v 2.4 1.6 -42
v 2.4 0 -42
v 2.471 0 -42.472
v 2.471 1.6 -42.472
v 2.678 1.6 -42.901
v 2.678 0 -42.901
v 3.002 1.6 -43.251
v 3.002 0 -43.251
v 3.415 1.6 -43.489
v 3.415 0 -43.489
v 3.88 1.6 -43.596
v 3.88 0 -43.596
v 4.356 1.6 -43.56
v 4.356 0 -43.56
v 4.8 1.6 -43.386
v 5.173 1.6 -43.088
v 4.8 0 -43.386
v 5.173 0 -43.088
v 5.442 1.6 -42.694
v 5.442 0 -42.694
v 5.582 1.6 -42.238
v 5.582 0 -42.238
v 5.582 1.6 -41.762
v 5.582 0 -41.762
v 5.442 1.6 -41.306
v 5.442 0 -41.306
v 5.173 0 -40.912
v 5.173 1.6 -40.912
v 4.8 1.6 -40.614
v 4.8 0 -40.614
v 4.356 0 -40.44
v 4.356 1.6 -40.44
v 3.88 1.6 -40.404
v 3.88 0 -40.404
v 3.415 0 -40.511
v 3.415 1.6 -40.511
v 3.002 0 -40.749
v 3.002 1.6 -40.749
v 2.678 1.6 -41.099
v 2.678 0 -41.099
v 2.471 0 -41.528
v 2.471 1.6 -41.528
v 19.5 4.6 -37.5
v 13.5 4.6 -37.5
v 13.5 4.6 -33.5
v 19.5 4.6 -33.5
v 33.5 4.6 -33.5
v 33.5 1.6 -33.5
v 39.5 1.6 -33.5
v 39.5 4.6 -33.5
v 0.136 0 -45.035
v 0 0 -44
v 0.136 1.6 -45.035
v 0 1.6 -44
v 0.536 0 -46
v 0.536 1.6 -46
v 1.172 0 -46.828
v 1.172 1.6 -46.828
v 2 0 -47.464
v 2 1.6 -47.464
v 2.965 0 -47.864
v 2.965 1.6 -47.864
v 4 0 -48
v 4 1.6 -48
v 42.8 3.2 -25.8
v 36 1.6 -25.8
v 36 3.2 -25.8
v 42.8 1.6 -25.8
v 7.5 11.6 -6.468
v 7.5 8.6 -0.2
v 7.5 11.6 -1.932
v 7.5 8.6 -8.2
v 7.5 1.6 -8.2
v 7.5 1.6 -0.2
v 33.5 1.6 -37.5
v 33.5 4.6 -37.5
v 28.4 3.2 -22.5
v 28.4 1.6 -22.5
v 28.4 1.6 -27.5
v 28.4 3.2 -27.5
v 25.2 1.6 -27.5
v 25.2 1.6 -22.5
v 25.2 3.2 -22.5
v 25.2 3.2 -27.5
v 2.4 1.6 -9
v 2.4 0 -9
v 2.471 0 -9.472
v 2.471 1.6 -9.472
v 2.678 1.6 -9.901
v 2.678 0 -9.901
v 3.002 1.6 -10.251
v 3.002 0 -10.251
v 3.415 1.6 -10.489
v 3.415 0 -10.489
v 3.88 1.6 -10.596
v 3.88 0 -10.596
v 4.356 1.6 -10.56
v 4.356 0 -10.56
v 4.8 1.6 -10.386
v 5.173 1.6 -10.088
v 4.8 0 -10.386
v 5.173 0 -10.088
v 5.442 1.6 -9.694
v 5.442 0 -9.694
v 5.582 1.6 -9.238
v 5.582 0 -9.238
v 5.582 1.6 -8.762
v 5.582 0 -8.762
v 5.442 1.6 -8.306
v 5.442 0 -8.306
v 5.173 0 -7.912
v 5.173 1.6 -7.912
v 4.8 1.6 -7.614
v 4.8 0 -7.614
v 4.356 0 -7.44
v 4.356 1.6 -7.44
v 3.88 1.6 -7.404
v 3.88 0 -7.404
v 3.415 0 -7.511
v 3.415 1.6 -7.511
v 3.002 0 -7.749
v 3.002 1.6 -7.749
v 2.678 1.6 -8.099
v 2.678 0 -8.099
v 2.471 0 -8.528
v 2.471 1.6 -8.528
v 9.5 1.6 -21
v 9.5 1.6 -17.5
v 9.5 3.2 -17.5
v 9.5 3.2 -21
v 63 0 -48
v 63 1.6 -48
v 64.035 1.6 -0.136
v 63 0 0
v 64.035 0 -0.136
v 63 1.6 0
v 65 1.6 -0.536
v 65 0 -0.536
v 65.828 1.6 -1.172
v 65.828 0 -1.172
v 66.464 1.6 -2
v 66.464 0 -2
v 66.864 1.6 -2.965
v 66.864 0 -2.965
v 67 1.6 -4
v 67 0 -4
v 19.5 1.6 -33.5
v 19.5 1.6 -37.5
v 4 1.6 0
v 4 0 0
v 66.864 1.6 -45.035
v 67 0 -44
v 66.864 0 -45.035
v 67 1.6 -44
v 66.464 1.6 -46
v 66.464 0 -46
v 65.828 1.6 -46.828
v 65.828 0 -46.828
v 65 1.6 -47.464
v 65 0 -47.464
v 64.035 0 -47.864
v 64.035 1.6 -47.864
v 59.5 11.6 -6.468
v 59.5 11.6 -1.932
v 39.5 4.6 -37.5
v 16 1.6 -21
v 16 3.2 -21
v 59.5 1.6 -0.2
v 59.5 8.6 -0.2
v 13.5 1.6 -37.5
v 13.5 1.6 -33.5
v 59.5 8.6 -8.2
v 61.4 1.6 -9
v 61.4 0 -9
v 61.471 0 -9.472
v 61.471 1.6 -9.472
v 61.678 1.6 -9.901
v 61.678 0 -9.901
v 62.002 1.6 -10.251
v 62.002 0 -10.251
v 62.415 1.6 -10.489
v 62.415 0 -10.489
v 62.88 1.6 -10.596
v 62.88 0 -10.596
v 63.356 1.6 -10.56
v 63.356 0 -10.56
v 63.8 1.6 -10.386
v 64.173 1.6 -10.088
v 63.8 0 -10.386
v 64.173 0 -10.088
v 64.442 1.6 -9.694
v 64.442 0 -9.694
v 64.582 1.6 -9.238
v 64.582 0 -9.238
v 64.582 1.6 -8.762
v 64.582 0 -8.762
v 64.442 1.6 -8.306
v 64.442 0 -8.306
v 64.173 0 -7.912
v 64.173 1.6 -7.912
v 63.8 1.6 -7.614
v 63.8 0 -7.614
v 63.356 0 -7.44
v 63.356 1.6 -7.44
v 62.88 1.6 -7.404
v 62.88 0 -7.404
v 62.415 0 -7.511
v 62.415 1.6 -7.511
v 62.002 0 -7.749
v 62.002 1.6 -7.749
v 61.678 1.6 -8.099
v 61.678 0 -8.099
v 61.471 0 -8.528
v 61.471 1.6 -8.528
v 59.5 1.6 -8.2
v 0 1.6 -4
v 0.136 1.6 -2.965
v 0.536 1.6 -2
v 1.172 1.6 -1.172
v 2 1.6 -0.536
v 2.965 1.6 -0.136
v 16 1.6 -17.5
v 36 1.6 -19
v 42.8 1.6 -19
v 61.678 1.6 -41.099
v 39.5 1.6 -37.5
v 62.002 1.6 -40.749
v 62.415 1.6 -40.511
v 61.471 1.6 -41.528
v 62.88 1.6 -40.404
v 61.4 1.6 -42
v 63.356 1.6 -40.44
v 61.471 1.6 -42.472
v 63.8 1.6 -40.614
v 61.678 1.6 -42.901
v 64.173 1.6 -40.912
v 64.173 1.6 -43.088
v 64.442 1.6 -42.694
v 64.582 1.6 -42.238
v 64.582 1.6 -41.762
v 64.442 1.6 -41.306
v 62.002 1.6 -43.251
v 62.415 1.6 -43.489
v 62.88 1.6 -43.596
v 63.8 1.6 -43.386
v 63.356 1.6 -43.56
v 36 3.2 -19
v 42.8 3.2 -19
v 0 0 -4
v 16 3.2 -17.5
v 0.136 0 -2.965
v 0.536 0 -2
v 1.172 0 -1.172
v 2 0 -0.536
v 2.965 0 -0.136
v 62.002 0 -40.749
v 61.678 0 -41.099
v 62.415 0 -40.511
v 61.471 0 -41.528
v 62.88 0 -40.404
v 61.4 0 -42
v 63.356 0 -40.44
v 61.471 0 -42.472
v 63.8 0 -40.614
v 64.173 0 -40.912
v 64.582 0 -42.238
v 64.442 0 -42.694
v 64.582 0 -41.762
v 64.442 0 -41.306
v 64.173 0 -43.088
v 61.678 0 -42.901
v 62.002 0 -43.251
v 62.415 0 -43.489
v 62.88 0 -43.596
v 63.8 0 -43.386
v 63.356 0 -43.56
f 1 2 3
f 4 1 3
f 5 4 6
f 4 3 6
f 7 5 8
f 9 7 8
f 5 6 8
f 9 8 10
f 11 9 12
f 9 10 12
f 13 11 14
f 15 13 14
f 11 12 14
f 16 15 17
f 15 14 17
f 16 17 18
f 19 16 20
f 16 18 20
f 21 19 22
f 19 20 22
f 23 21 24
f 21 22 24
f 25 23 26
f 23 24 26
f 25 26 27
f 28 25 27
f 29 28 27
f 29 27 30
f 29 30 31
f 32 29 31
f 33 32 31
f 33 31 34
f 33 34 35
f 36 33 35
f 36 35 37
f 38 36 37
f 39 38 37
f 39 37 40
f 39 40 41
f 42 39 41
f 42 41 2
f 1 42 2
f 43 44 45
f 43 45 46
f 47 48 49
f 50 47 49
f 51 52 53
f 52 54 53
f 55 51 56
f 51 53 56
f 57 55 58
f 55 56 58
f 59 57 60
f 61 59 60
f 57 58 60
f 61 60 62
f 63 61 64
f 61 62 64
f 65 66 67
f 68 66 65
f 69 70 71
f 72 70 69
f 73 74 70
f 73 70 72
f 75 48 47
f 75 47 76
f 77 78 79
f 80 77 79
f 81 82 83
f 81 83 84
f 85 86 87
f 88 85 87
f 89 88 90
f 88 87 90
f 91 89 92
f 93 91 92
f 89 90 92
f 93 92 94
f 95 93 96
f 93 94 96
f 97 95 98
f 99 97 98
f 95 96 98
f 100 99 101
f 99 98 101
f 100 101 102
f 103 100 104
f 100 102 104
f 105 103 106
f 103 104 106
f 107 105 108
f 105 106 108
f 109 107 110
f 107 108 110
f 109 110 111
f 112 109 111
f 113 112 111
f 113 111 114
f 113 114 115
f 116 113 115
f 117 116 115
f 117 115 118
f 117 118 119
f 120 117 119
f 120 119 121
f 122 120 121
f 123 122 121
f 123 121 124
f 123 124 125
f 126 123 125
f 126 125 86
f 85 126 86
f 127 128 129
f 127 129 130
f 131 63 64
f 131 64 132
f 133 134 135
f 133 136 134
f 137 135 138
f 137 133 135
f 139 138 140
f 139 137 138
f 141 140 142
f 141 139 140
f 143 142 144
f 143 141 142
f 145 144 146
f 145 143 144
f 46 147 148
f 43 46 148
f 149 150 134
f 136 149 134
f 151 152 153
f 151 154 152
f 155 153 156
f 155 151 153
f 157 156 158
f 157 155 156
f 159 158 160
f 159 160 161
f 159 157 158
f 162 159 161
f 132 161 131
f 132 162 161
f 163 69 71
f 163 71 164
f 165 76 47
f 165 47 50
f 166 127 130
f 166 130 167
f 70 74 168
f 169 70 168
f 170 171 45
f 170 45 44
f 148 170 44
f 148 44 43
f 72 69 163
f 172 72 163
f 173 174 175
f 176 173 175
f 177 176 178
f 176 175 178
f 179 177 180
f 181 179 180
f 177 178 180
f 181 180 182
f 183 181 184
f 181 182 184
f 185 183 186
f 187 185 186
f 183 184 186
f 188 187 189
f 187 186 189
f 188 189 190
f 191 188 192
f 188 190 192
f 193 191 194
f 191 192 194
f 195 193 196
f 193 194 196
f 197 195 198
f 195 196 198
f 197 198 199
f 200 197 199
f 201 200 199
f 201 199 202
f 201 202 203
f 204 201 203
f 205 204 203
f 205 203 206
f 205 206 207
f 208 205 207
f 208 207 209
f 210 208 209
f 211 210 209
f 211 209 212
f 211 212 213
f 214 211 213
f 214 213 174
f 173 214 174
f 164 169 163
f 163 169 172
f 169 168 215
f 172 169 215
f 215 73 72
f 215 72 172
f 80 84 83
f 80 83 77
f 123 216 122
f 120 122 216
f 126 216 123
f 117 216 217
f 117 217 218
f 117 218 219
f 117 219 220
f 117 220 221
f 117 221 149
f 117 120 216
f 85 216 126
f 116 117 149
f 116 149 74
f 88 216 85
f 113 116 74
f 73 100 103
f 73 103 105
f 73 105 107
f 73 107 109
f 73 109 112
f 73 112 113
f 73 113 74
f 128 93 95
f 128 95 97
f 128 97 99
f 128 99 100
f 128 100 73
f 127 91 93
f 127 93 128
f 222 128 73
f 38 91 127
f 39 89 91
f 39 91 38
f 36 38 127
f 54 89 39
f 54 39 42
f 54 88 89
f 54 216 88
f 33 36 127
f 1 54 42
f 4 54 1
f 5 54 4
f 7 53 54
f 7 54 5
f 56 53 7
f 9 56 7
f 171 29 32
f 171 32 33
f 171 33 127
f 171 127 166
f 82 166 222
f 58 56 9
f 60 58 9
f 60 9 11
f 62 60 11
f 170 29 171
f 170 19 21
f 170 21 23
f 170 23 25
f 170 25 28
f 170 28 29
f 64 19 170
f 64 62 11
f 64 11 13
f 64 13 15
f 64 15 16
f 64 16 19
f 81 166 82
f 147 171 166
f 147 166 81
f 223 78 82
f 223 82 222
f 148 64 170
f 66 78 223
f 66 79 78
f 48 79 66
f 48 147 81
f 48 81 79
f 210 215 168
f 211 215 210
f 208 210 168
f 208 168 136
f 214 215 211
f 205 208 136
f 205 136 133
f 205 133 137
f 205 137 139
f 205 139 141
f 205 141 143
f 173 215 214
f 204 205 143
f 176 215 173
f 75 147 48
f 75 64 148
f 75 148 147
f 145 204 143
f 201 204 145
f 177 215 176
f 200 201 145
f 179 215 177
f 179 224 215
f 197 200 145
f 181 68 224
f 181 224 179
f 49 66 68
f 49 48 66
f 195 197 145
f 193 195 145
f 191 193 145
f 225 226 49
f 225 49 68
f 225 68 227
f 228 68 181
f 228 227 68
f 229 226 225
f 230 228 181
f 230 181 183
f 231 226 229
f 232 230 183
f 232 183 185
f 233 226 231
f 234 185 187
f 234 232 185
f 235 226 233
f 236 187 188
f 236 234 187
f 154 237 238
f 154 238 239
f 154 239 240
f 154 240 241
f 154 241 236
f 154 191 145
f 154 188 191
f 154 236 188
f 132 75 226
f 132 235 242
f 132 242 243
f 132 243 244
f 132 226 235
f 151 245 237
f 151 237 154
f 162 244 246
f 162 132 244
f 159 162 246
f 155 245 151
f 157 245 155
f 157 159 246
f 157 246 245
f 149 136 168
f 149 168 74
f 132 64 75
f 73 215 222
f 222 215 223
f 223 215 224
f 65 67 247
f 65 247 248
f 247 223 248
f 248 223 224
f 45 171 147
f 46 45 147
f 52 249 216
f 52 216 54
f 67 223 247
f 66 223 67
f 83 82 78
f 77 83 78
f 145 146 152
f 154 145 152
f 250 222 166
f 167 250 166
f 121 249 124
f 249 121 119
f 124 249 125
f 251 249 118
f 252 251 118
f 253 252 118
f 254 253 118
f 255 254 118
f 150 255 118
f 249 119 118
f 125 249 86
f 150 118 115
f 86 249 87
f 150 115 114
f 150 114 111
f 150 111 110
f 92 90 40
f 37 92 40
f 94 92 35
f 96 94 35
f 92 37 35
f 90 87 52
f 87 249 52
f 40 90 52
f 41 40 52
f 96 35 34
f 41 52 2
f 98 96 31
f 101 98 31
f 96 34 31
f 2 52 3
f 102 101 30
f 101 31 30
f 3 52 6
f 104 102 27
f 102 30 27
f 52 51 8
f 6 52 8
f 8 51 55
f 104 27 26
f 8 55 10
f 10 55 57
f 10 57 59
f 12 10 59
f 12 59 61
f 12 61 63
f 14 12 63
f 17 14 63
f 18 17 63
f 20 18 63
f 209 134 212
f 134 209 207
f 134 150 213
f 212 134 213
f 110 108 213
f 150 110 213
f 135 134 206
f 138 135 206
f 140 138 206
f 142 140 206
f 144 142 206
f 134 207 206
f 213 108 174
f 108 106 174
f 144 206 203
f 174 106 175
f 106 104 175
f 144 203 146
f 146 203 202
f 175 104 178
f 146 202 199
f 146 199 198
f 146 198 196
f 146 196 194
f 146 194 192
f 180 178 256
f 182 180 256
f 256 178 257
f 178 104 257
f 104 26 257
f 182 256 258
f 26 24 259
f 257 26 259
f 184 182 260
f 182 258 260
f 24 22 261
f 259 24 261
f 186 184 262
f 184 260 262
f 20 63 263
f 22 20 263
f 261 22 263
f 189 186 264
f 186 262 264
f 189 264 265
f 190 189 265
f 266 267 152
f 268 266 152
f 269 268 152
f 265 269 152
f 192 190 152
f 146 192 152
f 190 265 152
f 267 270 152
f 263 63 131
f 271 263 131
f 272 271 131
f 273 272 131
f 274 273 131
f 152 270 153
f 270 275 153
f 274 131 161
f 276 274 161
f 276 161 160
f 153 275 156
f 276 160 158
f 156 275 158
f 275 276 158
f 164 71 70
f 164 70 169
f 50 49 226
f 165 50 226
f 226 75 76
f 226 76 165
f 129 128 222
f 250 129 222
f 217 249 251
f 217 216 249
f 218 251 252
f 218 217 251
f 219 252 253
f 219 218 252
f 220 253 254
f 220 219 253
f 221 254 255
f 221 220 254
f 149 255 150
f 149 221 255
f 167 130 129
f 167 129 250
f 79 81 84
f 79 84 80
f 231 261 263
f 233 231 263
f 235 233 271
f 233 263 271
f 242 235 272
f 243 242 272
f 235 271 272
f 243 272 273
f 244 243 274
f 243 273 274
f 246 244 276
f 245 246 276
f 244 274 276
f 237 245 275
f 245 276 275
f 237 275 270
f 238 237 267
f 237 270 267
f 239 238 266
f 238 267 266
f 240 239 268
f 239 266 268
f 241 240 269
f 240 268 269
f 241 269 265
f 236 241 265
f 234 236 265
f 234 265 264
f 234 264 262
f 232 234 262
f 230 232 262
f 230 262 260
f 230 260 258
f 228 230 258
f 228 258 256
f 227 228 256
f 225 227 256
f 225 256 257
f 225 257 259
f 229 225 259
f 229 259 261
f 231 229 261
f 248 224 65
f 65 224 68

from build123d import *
from OCP.BRepFilletAPI import BRepFilletAPI_MakeChamfer

# Parameters (mm, degrees)
SKETCH_1_W              = 67
SKETCH_1_H              = 48
EXTRUDE_1_DEPTH         = 1.6
FILLET_1_R              = 4
HOLE_WIZARD_3_2_3_2_1_D = 3.2
SKETCH_4_W              = 6.8
SKETCH_4_H              = 6.8
SKETCH_4_W_2            = 3.2
SKETCH_4_H_2            = 5
SKETCH_4_W_3            = 6.5
SKETCH_4_H_3            = 3.5
EXTRUDE_2_DEPTH         = 1.6
SKETCH_5_W              = 52
SKETCH_5_H              = 8
EXTRUDE_4_DEPTH         = 10
CHAMFER_1_SIZE          = 3
CHAMFER_1_SIZE2         = 1.732050808
SKETCH_7_W              = 6
SKETCH_7_H              = 4
EXTRUDE_5_DEPTH         = 3


with BuildPart() as part:
    # 草图1 → 凸台-拉伸1 (new body)
    with BuildSketch(Plane(origin=(0, 0, 0), x_dir=(1, 0, 0), z_dir=(0, 1, 0))):
        with Locations((33.5, 24)):
            Rectangle(SKETCH_1_W, SKETCH_1_H)
    extrude(amount=EXTRUDE_1_DEPTH)

    # 圆角1
    fillet_1_edges = [part.edges().sort_by_distance(p)[0] for p in [
        (0, 0.8, -48),
        (67, 0.8, -48),
        (67, 0.8, 0),
        (0, 0.8, 0),
    ]]
    fillet(fillet_1_edges, radius=FILLET_1_R)

    # Ø3.2 (3.2) 直径孔1 (through all)
    with Locations(Plane(origin=(0, 1.6, 0), x_dir=(1, 0, 0), z_dir=(0, 1, 0))):
        with Locations((4, 9), (4, 42), (63, 42), (63, 9)):
            Hole(HOLE_WIZARD_3_2_3_2_1_D / 2)

    # 草图4 → 凸台-拉伸2 (add)
    with BuildSketch(Plane(origin=(0, 1.6, 0), x_dir=(1, 0, 0), z_dir=(0, 1, 0))):
        with Locations((39.4, 22.4)):
            Rectangle(SKETCH_4_W, SKETCH_4_H)
        with Locations((26.8, 25)):
            Rectangle(SKETCH_4_W_2, SKETCH_4_H_2)
        with Locations((12.75, 19.25)):
            Rectangle(SKETCH_4_W_3, SKETCH_4_H_3)
    extrude(amount=EXTRUDE_2_DEPTH)

    # 草图5 → 凸台-拉伸4 (add)
    with BuildSketch(Plane(origin=(0, 1.6, 0), x_dir=(1, 0, 0), z_dir=(0, 1, 0))):
        with Locations((33.5, 4.2)):
            Rectangle(SKETCH_5_W, SKETCH_5_H)
    extrude(amount=EXTRUDE_4_DEPTH)

    # 倒角1: one chamfer whose edges measure the first distance from different faces: ONE call of the kernel's chamfer builder (chamfer() names one face for all edges)
    chamfer_1_edges_1 = [part.edges().sort_by_distance(p)[0] for p in [
        (33.5, 11.6, -0.2),
    ]]
    chamfer_1_side_1 = [part.faces().sort_by_distance(p)[0] for p in [
        (33.5, 6.6, -0.2),
    ]]
    chamfer_1_edges_2 = [part.edges().sort_by_distance(p)[0] for p in [
        (33.5, 11.6, -8.2),
    ]]
    chamfer_1_side_2 = [part.faces().sort_by_distance(p)[0] for p in [
        (33.5, 6.6, -8.2),
    ]]
    chamfer_1 = BRepFilletAPI_MakeChamfer(part.part.solid().wrapped)
    for e in chamfer_1_edges_1:
        chamfer_1.Add(CHAMFER_1_SIZE, CHAMFER_1_SIZE2, e.wrapped, chamfer_1_side_1[0].wrapped)  # the first distance lies on this face
    for e in chamfer_1_edges_2:
        chamfer_1.Add(CHAMFER_1_SIZE, CHAMFER_1_SIZE2, e.wrapped, chamfer_1_side_2[0].wrapped)  # the first distance lies on this face
    add(Compound.cast(chamfer_1.Shape()), mode=Mode.REPLACE)

    # 草图7 → 凸台-拉伸5 (add)
    with BuildSketch(Plane(origin=(0, 1.6, 0), x_dir=(1, 0, 0), z_dir=(0, 1, 0))):
        with Locations((16.5, 35.5)):
            Rectangle(SKETCH_7_W, SKETCH_7_H)
        with Locations((36.5, 35.5)):
            Rectangle(SKETCH_7_W, SKETCH_7_H)
    extrude(amount=EXTRUDE_5_DEPTH)


solid = part.part
